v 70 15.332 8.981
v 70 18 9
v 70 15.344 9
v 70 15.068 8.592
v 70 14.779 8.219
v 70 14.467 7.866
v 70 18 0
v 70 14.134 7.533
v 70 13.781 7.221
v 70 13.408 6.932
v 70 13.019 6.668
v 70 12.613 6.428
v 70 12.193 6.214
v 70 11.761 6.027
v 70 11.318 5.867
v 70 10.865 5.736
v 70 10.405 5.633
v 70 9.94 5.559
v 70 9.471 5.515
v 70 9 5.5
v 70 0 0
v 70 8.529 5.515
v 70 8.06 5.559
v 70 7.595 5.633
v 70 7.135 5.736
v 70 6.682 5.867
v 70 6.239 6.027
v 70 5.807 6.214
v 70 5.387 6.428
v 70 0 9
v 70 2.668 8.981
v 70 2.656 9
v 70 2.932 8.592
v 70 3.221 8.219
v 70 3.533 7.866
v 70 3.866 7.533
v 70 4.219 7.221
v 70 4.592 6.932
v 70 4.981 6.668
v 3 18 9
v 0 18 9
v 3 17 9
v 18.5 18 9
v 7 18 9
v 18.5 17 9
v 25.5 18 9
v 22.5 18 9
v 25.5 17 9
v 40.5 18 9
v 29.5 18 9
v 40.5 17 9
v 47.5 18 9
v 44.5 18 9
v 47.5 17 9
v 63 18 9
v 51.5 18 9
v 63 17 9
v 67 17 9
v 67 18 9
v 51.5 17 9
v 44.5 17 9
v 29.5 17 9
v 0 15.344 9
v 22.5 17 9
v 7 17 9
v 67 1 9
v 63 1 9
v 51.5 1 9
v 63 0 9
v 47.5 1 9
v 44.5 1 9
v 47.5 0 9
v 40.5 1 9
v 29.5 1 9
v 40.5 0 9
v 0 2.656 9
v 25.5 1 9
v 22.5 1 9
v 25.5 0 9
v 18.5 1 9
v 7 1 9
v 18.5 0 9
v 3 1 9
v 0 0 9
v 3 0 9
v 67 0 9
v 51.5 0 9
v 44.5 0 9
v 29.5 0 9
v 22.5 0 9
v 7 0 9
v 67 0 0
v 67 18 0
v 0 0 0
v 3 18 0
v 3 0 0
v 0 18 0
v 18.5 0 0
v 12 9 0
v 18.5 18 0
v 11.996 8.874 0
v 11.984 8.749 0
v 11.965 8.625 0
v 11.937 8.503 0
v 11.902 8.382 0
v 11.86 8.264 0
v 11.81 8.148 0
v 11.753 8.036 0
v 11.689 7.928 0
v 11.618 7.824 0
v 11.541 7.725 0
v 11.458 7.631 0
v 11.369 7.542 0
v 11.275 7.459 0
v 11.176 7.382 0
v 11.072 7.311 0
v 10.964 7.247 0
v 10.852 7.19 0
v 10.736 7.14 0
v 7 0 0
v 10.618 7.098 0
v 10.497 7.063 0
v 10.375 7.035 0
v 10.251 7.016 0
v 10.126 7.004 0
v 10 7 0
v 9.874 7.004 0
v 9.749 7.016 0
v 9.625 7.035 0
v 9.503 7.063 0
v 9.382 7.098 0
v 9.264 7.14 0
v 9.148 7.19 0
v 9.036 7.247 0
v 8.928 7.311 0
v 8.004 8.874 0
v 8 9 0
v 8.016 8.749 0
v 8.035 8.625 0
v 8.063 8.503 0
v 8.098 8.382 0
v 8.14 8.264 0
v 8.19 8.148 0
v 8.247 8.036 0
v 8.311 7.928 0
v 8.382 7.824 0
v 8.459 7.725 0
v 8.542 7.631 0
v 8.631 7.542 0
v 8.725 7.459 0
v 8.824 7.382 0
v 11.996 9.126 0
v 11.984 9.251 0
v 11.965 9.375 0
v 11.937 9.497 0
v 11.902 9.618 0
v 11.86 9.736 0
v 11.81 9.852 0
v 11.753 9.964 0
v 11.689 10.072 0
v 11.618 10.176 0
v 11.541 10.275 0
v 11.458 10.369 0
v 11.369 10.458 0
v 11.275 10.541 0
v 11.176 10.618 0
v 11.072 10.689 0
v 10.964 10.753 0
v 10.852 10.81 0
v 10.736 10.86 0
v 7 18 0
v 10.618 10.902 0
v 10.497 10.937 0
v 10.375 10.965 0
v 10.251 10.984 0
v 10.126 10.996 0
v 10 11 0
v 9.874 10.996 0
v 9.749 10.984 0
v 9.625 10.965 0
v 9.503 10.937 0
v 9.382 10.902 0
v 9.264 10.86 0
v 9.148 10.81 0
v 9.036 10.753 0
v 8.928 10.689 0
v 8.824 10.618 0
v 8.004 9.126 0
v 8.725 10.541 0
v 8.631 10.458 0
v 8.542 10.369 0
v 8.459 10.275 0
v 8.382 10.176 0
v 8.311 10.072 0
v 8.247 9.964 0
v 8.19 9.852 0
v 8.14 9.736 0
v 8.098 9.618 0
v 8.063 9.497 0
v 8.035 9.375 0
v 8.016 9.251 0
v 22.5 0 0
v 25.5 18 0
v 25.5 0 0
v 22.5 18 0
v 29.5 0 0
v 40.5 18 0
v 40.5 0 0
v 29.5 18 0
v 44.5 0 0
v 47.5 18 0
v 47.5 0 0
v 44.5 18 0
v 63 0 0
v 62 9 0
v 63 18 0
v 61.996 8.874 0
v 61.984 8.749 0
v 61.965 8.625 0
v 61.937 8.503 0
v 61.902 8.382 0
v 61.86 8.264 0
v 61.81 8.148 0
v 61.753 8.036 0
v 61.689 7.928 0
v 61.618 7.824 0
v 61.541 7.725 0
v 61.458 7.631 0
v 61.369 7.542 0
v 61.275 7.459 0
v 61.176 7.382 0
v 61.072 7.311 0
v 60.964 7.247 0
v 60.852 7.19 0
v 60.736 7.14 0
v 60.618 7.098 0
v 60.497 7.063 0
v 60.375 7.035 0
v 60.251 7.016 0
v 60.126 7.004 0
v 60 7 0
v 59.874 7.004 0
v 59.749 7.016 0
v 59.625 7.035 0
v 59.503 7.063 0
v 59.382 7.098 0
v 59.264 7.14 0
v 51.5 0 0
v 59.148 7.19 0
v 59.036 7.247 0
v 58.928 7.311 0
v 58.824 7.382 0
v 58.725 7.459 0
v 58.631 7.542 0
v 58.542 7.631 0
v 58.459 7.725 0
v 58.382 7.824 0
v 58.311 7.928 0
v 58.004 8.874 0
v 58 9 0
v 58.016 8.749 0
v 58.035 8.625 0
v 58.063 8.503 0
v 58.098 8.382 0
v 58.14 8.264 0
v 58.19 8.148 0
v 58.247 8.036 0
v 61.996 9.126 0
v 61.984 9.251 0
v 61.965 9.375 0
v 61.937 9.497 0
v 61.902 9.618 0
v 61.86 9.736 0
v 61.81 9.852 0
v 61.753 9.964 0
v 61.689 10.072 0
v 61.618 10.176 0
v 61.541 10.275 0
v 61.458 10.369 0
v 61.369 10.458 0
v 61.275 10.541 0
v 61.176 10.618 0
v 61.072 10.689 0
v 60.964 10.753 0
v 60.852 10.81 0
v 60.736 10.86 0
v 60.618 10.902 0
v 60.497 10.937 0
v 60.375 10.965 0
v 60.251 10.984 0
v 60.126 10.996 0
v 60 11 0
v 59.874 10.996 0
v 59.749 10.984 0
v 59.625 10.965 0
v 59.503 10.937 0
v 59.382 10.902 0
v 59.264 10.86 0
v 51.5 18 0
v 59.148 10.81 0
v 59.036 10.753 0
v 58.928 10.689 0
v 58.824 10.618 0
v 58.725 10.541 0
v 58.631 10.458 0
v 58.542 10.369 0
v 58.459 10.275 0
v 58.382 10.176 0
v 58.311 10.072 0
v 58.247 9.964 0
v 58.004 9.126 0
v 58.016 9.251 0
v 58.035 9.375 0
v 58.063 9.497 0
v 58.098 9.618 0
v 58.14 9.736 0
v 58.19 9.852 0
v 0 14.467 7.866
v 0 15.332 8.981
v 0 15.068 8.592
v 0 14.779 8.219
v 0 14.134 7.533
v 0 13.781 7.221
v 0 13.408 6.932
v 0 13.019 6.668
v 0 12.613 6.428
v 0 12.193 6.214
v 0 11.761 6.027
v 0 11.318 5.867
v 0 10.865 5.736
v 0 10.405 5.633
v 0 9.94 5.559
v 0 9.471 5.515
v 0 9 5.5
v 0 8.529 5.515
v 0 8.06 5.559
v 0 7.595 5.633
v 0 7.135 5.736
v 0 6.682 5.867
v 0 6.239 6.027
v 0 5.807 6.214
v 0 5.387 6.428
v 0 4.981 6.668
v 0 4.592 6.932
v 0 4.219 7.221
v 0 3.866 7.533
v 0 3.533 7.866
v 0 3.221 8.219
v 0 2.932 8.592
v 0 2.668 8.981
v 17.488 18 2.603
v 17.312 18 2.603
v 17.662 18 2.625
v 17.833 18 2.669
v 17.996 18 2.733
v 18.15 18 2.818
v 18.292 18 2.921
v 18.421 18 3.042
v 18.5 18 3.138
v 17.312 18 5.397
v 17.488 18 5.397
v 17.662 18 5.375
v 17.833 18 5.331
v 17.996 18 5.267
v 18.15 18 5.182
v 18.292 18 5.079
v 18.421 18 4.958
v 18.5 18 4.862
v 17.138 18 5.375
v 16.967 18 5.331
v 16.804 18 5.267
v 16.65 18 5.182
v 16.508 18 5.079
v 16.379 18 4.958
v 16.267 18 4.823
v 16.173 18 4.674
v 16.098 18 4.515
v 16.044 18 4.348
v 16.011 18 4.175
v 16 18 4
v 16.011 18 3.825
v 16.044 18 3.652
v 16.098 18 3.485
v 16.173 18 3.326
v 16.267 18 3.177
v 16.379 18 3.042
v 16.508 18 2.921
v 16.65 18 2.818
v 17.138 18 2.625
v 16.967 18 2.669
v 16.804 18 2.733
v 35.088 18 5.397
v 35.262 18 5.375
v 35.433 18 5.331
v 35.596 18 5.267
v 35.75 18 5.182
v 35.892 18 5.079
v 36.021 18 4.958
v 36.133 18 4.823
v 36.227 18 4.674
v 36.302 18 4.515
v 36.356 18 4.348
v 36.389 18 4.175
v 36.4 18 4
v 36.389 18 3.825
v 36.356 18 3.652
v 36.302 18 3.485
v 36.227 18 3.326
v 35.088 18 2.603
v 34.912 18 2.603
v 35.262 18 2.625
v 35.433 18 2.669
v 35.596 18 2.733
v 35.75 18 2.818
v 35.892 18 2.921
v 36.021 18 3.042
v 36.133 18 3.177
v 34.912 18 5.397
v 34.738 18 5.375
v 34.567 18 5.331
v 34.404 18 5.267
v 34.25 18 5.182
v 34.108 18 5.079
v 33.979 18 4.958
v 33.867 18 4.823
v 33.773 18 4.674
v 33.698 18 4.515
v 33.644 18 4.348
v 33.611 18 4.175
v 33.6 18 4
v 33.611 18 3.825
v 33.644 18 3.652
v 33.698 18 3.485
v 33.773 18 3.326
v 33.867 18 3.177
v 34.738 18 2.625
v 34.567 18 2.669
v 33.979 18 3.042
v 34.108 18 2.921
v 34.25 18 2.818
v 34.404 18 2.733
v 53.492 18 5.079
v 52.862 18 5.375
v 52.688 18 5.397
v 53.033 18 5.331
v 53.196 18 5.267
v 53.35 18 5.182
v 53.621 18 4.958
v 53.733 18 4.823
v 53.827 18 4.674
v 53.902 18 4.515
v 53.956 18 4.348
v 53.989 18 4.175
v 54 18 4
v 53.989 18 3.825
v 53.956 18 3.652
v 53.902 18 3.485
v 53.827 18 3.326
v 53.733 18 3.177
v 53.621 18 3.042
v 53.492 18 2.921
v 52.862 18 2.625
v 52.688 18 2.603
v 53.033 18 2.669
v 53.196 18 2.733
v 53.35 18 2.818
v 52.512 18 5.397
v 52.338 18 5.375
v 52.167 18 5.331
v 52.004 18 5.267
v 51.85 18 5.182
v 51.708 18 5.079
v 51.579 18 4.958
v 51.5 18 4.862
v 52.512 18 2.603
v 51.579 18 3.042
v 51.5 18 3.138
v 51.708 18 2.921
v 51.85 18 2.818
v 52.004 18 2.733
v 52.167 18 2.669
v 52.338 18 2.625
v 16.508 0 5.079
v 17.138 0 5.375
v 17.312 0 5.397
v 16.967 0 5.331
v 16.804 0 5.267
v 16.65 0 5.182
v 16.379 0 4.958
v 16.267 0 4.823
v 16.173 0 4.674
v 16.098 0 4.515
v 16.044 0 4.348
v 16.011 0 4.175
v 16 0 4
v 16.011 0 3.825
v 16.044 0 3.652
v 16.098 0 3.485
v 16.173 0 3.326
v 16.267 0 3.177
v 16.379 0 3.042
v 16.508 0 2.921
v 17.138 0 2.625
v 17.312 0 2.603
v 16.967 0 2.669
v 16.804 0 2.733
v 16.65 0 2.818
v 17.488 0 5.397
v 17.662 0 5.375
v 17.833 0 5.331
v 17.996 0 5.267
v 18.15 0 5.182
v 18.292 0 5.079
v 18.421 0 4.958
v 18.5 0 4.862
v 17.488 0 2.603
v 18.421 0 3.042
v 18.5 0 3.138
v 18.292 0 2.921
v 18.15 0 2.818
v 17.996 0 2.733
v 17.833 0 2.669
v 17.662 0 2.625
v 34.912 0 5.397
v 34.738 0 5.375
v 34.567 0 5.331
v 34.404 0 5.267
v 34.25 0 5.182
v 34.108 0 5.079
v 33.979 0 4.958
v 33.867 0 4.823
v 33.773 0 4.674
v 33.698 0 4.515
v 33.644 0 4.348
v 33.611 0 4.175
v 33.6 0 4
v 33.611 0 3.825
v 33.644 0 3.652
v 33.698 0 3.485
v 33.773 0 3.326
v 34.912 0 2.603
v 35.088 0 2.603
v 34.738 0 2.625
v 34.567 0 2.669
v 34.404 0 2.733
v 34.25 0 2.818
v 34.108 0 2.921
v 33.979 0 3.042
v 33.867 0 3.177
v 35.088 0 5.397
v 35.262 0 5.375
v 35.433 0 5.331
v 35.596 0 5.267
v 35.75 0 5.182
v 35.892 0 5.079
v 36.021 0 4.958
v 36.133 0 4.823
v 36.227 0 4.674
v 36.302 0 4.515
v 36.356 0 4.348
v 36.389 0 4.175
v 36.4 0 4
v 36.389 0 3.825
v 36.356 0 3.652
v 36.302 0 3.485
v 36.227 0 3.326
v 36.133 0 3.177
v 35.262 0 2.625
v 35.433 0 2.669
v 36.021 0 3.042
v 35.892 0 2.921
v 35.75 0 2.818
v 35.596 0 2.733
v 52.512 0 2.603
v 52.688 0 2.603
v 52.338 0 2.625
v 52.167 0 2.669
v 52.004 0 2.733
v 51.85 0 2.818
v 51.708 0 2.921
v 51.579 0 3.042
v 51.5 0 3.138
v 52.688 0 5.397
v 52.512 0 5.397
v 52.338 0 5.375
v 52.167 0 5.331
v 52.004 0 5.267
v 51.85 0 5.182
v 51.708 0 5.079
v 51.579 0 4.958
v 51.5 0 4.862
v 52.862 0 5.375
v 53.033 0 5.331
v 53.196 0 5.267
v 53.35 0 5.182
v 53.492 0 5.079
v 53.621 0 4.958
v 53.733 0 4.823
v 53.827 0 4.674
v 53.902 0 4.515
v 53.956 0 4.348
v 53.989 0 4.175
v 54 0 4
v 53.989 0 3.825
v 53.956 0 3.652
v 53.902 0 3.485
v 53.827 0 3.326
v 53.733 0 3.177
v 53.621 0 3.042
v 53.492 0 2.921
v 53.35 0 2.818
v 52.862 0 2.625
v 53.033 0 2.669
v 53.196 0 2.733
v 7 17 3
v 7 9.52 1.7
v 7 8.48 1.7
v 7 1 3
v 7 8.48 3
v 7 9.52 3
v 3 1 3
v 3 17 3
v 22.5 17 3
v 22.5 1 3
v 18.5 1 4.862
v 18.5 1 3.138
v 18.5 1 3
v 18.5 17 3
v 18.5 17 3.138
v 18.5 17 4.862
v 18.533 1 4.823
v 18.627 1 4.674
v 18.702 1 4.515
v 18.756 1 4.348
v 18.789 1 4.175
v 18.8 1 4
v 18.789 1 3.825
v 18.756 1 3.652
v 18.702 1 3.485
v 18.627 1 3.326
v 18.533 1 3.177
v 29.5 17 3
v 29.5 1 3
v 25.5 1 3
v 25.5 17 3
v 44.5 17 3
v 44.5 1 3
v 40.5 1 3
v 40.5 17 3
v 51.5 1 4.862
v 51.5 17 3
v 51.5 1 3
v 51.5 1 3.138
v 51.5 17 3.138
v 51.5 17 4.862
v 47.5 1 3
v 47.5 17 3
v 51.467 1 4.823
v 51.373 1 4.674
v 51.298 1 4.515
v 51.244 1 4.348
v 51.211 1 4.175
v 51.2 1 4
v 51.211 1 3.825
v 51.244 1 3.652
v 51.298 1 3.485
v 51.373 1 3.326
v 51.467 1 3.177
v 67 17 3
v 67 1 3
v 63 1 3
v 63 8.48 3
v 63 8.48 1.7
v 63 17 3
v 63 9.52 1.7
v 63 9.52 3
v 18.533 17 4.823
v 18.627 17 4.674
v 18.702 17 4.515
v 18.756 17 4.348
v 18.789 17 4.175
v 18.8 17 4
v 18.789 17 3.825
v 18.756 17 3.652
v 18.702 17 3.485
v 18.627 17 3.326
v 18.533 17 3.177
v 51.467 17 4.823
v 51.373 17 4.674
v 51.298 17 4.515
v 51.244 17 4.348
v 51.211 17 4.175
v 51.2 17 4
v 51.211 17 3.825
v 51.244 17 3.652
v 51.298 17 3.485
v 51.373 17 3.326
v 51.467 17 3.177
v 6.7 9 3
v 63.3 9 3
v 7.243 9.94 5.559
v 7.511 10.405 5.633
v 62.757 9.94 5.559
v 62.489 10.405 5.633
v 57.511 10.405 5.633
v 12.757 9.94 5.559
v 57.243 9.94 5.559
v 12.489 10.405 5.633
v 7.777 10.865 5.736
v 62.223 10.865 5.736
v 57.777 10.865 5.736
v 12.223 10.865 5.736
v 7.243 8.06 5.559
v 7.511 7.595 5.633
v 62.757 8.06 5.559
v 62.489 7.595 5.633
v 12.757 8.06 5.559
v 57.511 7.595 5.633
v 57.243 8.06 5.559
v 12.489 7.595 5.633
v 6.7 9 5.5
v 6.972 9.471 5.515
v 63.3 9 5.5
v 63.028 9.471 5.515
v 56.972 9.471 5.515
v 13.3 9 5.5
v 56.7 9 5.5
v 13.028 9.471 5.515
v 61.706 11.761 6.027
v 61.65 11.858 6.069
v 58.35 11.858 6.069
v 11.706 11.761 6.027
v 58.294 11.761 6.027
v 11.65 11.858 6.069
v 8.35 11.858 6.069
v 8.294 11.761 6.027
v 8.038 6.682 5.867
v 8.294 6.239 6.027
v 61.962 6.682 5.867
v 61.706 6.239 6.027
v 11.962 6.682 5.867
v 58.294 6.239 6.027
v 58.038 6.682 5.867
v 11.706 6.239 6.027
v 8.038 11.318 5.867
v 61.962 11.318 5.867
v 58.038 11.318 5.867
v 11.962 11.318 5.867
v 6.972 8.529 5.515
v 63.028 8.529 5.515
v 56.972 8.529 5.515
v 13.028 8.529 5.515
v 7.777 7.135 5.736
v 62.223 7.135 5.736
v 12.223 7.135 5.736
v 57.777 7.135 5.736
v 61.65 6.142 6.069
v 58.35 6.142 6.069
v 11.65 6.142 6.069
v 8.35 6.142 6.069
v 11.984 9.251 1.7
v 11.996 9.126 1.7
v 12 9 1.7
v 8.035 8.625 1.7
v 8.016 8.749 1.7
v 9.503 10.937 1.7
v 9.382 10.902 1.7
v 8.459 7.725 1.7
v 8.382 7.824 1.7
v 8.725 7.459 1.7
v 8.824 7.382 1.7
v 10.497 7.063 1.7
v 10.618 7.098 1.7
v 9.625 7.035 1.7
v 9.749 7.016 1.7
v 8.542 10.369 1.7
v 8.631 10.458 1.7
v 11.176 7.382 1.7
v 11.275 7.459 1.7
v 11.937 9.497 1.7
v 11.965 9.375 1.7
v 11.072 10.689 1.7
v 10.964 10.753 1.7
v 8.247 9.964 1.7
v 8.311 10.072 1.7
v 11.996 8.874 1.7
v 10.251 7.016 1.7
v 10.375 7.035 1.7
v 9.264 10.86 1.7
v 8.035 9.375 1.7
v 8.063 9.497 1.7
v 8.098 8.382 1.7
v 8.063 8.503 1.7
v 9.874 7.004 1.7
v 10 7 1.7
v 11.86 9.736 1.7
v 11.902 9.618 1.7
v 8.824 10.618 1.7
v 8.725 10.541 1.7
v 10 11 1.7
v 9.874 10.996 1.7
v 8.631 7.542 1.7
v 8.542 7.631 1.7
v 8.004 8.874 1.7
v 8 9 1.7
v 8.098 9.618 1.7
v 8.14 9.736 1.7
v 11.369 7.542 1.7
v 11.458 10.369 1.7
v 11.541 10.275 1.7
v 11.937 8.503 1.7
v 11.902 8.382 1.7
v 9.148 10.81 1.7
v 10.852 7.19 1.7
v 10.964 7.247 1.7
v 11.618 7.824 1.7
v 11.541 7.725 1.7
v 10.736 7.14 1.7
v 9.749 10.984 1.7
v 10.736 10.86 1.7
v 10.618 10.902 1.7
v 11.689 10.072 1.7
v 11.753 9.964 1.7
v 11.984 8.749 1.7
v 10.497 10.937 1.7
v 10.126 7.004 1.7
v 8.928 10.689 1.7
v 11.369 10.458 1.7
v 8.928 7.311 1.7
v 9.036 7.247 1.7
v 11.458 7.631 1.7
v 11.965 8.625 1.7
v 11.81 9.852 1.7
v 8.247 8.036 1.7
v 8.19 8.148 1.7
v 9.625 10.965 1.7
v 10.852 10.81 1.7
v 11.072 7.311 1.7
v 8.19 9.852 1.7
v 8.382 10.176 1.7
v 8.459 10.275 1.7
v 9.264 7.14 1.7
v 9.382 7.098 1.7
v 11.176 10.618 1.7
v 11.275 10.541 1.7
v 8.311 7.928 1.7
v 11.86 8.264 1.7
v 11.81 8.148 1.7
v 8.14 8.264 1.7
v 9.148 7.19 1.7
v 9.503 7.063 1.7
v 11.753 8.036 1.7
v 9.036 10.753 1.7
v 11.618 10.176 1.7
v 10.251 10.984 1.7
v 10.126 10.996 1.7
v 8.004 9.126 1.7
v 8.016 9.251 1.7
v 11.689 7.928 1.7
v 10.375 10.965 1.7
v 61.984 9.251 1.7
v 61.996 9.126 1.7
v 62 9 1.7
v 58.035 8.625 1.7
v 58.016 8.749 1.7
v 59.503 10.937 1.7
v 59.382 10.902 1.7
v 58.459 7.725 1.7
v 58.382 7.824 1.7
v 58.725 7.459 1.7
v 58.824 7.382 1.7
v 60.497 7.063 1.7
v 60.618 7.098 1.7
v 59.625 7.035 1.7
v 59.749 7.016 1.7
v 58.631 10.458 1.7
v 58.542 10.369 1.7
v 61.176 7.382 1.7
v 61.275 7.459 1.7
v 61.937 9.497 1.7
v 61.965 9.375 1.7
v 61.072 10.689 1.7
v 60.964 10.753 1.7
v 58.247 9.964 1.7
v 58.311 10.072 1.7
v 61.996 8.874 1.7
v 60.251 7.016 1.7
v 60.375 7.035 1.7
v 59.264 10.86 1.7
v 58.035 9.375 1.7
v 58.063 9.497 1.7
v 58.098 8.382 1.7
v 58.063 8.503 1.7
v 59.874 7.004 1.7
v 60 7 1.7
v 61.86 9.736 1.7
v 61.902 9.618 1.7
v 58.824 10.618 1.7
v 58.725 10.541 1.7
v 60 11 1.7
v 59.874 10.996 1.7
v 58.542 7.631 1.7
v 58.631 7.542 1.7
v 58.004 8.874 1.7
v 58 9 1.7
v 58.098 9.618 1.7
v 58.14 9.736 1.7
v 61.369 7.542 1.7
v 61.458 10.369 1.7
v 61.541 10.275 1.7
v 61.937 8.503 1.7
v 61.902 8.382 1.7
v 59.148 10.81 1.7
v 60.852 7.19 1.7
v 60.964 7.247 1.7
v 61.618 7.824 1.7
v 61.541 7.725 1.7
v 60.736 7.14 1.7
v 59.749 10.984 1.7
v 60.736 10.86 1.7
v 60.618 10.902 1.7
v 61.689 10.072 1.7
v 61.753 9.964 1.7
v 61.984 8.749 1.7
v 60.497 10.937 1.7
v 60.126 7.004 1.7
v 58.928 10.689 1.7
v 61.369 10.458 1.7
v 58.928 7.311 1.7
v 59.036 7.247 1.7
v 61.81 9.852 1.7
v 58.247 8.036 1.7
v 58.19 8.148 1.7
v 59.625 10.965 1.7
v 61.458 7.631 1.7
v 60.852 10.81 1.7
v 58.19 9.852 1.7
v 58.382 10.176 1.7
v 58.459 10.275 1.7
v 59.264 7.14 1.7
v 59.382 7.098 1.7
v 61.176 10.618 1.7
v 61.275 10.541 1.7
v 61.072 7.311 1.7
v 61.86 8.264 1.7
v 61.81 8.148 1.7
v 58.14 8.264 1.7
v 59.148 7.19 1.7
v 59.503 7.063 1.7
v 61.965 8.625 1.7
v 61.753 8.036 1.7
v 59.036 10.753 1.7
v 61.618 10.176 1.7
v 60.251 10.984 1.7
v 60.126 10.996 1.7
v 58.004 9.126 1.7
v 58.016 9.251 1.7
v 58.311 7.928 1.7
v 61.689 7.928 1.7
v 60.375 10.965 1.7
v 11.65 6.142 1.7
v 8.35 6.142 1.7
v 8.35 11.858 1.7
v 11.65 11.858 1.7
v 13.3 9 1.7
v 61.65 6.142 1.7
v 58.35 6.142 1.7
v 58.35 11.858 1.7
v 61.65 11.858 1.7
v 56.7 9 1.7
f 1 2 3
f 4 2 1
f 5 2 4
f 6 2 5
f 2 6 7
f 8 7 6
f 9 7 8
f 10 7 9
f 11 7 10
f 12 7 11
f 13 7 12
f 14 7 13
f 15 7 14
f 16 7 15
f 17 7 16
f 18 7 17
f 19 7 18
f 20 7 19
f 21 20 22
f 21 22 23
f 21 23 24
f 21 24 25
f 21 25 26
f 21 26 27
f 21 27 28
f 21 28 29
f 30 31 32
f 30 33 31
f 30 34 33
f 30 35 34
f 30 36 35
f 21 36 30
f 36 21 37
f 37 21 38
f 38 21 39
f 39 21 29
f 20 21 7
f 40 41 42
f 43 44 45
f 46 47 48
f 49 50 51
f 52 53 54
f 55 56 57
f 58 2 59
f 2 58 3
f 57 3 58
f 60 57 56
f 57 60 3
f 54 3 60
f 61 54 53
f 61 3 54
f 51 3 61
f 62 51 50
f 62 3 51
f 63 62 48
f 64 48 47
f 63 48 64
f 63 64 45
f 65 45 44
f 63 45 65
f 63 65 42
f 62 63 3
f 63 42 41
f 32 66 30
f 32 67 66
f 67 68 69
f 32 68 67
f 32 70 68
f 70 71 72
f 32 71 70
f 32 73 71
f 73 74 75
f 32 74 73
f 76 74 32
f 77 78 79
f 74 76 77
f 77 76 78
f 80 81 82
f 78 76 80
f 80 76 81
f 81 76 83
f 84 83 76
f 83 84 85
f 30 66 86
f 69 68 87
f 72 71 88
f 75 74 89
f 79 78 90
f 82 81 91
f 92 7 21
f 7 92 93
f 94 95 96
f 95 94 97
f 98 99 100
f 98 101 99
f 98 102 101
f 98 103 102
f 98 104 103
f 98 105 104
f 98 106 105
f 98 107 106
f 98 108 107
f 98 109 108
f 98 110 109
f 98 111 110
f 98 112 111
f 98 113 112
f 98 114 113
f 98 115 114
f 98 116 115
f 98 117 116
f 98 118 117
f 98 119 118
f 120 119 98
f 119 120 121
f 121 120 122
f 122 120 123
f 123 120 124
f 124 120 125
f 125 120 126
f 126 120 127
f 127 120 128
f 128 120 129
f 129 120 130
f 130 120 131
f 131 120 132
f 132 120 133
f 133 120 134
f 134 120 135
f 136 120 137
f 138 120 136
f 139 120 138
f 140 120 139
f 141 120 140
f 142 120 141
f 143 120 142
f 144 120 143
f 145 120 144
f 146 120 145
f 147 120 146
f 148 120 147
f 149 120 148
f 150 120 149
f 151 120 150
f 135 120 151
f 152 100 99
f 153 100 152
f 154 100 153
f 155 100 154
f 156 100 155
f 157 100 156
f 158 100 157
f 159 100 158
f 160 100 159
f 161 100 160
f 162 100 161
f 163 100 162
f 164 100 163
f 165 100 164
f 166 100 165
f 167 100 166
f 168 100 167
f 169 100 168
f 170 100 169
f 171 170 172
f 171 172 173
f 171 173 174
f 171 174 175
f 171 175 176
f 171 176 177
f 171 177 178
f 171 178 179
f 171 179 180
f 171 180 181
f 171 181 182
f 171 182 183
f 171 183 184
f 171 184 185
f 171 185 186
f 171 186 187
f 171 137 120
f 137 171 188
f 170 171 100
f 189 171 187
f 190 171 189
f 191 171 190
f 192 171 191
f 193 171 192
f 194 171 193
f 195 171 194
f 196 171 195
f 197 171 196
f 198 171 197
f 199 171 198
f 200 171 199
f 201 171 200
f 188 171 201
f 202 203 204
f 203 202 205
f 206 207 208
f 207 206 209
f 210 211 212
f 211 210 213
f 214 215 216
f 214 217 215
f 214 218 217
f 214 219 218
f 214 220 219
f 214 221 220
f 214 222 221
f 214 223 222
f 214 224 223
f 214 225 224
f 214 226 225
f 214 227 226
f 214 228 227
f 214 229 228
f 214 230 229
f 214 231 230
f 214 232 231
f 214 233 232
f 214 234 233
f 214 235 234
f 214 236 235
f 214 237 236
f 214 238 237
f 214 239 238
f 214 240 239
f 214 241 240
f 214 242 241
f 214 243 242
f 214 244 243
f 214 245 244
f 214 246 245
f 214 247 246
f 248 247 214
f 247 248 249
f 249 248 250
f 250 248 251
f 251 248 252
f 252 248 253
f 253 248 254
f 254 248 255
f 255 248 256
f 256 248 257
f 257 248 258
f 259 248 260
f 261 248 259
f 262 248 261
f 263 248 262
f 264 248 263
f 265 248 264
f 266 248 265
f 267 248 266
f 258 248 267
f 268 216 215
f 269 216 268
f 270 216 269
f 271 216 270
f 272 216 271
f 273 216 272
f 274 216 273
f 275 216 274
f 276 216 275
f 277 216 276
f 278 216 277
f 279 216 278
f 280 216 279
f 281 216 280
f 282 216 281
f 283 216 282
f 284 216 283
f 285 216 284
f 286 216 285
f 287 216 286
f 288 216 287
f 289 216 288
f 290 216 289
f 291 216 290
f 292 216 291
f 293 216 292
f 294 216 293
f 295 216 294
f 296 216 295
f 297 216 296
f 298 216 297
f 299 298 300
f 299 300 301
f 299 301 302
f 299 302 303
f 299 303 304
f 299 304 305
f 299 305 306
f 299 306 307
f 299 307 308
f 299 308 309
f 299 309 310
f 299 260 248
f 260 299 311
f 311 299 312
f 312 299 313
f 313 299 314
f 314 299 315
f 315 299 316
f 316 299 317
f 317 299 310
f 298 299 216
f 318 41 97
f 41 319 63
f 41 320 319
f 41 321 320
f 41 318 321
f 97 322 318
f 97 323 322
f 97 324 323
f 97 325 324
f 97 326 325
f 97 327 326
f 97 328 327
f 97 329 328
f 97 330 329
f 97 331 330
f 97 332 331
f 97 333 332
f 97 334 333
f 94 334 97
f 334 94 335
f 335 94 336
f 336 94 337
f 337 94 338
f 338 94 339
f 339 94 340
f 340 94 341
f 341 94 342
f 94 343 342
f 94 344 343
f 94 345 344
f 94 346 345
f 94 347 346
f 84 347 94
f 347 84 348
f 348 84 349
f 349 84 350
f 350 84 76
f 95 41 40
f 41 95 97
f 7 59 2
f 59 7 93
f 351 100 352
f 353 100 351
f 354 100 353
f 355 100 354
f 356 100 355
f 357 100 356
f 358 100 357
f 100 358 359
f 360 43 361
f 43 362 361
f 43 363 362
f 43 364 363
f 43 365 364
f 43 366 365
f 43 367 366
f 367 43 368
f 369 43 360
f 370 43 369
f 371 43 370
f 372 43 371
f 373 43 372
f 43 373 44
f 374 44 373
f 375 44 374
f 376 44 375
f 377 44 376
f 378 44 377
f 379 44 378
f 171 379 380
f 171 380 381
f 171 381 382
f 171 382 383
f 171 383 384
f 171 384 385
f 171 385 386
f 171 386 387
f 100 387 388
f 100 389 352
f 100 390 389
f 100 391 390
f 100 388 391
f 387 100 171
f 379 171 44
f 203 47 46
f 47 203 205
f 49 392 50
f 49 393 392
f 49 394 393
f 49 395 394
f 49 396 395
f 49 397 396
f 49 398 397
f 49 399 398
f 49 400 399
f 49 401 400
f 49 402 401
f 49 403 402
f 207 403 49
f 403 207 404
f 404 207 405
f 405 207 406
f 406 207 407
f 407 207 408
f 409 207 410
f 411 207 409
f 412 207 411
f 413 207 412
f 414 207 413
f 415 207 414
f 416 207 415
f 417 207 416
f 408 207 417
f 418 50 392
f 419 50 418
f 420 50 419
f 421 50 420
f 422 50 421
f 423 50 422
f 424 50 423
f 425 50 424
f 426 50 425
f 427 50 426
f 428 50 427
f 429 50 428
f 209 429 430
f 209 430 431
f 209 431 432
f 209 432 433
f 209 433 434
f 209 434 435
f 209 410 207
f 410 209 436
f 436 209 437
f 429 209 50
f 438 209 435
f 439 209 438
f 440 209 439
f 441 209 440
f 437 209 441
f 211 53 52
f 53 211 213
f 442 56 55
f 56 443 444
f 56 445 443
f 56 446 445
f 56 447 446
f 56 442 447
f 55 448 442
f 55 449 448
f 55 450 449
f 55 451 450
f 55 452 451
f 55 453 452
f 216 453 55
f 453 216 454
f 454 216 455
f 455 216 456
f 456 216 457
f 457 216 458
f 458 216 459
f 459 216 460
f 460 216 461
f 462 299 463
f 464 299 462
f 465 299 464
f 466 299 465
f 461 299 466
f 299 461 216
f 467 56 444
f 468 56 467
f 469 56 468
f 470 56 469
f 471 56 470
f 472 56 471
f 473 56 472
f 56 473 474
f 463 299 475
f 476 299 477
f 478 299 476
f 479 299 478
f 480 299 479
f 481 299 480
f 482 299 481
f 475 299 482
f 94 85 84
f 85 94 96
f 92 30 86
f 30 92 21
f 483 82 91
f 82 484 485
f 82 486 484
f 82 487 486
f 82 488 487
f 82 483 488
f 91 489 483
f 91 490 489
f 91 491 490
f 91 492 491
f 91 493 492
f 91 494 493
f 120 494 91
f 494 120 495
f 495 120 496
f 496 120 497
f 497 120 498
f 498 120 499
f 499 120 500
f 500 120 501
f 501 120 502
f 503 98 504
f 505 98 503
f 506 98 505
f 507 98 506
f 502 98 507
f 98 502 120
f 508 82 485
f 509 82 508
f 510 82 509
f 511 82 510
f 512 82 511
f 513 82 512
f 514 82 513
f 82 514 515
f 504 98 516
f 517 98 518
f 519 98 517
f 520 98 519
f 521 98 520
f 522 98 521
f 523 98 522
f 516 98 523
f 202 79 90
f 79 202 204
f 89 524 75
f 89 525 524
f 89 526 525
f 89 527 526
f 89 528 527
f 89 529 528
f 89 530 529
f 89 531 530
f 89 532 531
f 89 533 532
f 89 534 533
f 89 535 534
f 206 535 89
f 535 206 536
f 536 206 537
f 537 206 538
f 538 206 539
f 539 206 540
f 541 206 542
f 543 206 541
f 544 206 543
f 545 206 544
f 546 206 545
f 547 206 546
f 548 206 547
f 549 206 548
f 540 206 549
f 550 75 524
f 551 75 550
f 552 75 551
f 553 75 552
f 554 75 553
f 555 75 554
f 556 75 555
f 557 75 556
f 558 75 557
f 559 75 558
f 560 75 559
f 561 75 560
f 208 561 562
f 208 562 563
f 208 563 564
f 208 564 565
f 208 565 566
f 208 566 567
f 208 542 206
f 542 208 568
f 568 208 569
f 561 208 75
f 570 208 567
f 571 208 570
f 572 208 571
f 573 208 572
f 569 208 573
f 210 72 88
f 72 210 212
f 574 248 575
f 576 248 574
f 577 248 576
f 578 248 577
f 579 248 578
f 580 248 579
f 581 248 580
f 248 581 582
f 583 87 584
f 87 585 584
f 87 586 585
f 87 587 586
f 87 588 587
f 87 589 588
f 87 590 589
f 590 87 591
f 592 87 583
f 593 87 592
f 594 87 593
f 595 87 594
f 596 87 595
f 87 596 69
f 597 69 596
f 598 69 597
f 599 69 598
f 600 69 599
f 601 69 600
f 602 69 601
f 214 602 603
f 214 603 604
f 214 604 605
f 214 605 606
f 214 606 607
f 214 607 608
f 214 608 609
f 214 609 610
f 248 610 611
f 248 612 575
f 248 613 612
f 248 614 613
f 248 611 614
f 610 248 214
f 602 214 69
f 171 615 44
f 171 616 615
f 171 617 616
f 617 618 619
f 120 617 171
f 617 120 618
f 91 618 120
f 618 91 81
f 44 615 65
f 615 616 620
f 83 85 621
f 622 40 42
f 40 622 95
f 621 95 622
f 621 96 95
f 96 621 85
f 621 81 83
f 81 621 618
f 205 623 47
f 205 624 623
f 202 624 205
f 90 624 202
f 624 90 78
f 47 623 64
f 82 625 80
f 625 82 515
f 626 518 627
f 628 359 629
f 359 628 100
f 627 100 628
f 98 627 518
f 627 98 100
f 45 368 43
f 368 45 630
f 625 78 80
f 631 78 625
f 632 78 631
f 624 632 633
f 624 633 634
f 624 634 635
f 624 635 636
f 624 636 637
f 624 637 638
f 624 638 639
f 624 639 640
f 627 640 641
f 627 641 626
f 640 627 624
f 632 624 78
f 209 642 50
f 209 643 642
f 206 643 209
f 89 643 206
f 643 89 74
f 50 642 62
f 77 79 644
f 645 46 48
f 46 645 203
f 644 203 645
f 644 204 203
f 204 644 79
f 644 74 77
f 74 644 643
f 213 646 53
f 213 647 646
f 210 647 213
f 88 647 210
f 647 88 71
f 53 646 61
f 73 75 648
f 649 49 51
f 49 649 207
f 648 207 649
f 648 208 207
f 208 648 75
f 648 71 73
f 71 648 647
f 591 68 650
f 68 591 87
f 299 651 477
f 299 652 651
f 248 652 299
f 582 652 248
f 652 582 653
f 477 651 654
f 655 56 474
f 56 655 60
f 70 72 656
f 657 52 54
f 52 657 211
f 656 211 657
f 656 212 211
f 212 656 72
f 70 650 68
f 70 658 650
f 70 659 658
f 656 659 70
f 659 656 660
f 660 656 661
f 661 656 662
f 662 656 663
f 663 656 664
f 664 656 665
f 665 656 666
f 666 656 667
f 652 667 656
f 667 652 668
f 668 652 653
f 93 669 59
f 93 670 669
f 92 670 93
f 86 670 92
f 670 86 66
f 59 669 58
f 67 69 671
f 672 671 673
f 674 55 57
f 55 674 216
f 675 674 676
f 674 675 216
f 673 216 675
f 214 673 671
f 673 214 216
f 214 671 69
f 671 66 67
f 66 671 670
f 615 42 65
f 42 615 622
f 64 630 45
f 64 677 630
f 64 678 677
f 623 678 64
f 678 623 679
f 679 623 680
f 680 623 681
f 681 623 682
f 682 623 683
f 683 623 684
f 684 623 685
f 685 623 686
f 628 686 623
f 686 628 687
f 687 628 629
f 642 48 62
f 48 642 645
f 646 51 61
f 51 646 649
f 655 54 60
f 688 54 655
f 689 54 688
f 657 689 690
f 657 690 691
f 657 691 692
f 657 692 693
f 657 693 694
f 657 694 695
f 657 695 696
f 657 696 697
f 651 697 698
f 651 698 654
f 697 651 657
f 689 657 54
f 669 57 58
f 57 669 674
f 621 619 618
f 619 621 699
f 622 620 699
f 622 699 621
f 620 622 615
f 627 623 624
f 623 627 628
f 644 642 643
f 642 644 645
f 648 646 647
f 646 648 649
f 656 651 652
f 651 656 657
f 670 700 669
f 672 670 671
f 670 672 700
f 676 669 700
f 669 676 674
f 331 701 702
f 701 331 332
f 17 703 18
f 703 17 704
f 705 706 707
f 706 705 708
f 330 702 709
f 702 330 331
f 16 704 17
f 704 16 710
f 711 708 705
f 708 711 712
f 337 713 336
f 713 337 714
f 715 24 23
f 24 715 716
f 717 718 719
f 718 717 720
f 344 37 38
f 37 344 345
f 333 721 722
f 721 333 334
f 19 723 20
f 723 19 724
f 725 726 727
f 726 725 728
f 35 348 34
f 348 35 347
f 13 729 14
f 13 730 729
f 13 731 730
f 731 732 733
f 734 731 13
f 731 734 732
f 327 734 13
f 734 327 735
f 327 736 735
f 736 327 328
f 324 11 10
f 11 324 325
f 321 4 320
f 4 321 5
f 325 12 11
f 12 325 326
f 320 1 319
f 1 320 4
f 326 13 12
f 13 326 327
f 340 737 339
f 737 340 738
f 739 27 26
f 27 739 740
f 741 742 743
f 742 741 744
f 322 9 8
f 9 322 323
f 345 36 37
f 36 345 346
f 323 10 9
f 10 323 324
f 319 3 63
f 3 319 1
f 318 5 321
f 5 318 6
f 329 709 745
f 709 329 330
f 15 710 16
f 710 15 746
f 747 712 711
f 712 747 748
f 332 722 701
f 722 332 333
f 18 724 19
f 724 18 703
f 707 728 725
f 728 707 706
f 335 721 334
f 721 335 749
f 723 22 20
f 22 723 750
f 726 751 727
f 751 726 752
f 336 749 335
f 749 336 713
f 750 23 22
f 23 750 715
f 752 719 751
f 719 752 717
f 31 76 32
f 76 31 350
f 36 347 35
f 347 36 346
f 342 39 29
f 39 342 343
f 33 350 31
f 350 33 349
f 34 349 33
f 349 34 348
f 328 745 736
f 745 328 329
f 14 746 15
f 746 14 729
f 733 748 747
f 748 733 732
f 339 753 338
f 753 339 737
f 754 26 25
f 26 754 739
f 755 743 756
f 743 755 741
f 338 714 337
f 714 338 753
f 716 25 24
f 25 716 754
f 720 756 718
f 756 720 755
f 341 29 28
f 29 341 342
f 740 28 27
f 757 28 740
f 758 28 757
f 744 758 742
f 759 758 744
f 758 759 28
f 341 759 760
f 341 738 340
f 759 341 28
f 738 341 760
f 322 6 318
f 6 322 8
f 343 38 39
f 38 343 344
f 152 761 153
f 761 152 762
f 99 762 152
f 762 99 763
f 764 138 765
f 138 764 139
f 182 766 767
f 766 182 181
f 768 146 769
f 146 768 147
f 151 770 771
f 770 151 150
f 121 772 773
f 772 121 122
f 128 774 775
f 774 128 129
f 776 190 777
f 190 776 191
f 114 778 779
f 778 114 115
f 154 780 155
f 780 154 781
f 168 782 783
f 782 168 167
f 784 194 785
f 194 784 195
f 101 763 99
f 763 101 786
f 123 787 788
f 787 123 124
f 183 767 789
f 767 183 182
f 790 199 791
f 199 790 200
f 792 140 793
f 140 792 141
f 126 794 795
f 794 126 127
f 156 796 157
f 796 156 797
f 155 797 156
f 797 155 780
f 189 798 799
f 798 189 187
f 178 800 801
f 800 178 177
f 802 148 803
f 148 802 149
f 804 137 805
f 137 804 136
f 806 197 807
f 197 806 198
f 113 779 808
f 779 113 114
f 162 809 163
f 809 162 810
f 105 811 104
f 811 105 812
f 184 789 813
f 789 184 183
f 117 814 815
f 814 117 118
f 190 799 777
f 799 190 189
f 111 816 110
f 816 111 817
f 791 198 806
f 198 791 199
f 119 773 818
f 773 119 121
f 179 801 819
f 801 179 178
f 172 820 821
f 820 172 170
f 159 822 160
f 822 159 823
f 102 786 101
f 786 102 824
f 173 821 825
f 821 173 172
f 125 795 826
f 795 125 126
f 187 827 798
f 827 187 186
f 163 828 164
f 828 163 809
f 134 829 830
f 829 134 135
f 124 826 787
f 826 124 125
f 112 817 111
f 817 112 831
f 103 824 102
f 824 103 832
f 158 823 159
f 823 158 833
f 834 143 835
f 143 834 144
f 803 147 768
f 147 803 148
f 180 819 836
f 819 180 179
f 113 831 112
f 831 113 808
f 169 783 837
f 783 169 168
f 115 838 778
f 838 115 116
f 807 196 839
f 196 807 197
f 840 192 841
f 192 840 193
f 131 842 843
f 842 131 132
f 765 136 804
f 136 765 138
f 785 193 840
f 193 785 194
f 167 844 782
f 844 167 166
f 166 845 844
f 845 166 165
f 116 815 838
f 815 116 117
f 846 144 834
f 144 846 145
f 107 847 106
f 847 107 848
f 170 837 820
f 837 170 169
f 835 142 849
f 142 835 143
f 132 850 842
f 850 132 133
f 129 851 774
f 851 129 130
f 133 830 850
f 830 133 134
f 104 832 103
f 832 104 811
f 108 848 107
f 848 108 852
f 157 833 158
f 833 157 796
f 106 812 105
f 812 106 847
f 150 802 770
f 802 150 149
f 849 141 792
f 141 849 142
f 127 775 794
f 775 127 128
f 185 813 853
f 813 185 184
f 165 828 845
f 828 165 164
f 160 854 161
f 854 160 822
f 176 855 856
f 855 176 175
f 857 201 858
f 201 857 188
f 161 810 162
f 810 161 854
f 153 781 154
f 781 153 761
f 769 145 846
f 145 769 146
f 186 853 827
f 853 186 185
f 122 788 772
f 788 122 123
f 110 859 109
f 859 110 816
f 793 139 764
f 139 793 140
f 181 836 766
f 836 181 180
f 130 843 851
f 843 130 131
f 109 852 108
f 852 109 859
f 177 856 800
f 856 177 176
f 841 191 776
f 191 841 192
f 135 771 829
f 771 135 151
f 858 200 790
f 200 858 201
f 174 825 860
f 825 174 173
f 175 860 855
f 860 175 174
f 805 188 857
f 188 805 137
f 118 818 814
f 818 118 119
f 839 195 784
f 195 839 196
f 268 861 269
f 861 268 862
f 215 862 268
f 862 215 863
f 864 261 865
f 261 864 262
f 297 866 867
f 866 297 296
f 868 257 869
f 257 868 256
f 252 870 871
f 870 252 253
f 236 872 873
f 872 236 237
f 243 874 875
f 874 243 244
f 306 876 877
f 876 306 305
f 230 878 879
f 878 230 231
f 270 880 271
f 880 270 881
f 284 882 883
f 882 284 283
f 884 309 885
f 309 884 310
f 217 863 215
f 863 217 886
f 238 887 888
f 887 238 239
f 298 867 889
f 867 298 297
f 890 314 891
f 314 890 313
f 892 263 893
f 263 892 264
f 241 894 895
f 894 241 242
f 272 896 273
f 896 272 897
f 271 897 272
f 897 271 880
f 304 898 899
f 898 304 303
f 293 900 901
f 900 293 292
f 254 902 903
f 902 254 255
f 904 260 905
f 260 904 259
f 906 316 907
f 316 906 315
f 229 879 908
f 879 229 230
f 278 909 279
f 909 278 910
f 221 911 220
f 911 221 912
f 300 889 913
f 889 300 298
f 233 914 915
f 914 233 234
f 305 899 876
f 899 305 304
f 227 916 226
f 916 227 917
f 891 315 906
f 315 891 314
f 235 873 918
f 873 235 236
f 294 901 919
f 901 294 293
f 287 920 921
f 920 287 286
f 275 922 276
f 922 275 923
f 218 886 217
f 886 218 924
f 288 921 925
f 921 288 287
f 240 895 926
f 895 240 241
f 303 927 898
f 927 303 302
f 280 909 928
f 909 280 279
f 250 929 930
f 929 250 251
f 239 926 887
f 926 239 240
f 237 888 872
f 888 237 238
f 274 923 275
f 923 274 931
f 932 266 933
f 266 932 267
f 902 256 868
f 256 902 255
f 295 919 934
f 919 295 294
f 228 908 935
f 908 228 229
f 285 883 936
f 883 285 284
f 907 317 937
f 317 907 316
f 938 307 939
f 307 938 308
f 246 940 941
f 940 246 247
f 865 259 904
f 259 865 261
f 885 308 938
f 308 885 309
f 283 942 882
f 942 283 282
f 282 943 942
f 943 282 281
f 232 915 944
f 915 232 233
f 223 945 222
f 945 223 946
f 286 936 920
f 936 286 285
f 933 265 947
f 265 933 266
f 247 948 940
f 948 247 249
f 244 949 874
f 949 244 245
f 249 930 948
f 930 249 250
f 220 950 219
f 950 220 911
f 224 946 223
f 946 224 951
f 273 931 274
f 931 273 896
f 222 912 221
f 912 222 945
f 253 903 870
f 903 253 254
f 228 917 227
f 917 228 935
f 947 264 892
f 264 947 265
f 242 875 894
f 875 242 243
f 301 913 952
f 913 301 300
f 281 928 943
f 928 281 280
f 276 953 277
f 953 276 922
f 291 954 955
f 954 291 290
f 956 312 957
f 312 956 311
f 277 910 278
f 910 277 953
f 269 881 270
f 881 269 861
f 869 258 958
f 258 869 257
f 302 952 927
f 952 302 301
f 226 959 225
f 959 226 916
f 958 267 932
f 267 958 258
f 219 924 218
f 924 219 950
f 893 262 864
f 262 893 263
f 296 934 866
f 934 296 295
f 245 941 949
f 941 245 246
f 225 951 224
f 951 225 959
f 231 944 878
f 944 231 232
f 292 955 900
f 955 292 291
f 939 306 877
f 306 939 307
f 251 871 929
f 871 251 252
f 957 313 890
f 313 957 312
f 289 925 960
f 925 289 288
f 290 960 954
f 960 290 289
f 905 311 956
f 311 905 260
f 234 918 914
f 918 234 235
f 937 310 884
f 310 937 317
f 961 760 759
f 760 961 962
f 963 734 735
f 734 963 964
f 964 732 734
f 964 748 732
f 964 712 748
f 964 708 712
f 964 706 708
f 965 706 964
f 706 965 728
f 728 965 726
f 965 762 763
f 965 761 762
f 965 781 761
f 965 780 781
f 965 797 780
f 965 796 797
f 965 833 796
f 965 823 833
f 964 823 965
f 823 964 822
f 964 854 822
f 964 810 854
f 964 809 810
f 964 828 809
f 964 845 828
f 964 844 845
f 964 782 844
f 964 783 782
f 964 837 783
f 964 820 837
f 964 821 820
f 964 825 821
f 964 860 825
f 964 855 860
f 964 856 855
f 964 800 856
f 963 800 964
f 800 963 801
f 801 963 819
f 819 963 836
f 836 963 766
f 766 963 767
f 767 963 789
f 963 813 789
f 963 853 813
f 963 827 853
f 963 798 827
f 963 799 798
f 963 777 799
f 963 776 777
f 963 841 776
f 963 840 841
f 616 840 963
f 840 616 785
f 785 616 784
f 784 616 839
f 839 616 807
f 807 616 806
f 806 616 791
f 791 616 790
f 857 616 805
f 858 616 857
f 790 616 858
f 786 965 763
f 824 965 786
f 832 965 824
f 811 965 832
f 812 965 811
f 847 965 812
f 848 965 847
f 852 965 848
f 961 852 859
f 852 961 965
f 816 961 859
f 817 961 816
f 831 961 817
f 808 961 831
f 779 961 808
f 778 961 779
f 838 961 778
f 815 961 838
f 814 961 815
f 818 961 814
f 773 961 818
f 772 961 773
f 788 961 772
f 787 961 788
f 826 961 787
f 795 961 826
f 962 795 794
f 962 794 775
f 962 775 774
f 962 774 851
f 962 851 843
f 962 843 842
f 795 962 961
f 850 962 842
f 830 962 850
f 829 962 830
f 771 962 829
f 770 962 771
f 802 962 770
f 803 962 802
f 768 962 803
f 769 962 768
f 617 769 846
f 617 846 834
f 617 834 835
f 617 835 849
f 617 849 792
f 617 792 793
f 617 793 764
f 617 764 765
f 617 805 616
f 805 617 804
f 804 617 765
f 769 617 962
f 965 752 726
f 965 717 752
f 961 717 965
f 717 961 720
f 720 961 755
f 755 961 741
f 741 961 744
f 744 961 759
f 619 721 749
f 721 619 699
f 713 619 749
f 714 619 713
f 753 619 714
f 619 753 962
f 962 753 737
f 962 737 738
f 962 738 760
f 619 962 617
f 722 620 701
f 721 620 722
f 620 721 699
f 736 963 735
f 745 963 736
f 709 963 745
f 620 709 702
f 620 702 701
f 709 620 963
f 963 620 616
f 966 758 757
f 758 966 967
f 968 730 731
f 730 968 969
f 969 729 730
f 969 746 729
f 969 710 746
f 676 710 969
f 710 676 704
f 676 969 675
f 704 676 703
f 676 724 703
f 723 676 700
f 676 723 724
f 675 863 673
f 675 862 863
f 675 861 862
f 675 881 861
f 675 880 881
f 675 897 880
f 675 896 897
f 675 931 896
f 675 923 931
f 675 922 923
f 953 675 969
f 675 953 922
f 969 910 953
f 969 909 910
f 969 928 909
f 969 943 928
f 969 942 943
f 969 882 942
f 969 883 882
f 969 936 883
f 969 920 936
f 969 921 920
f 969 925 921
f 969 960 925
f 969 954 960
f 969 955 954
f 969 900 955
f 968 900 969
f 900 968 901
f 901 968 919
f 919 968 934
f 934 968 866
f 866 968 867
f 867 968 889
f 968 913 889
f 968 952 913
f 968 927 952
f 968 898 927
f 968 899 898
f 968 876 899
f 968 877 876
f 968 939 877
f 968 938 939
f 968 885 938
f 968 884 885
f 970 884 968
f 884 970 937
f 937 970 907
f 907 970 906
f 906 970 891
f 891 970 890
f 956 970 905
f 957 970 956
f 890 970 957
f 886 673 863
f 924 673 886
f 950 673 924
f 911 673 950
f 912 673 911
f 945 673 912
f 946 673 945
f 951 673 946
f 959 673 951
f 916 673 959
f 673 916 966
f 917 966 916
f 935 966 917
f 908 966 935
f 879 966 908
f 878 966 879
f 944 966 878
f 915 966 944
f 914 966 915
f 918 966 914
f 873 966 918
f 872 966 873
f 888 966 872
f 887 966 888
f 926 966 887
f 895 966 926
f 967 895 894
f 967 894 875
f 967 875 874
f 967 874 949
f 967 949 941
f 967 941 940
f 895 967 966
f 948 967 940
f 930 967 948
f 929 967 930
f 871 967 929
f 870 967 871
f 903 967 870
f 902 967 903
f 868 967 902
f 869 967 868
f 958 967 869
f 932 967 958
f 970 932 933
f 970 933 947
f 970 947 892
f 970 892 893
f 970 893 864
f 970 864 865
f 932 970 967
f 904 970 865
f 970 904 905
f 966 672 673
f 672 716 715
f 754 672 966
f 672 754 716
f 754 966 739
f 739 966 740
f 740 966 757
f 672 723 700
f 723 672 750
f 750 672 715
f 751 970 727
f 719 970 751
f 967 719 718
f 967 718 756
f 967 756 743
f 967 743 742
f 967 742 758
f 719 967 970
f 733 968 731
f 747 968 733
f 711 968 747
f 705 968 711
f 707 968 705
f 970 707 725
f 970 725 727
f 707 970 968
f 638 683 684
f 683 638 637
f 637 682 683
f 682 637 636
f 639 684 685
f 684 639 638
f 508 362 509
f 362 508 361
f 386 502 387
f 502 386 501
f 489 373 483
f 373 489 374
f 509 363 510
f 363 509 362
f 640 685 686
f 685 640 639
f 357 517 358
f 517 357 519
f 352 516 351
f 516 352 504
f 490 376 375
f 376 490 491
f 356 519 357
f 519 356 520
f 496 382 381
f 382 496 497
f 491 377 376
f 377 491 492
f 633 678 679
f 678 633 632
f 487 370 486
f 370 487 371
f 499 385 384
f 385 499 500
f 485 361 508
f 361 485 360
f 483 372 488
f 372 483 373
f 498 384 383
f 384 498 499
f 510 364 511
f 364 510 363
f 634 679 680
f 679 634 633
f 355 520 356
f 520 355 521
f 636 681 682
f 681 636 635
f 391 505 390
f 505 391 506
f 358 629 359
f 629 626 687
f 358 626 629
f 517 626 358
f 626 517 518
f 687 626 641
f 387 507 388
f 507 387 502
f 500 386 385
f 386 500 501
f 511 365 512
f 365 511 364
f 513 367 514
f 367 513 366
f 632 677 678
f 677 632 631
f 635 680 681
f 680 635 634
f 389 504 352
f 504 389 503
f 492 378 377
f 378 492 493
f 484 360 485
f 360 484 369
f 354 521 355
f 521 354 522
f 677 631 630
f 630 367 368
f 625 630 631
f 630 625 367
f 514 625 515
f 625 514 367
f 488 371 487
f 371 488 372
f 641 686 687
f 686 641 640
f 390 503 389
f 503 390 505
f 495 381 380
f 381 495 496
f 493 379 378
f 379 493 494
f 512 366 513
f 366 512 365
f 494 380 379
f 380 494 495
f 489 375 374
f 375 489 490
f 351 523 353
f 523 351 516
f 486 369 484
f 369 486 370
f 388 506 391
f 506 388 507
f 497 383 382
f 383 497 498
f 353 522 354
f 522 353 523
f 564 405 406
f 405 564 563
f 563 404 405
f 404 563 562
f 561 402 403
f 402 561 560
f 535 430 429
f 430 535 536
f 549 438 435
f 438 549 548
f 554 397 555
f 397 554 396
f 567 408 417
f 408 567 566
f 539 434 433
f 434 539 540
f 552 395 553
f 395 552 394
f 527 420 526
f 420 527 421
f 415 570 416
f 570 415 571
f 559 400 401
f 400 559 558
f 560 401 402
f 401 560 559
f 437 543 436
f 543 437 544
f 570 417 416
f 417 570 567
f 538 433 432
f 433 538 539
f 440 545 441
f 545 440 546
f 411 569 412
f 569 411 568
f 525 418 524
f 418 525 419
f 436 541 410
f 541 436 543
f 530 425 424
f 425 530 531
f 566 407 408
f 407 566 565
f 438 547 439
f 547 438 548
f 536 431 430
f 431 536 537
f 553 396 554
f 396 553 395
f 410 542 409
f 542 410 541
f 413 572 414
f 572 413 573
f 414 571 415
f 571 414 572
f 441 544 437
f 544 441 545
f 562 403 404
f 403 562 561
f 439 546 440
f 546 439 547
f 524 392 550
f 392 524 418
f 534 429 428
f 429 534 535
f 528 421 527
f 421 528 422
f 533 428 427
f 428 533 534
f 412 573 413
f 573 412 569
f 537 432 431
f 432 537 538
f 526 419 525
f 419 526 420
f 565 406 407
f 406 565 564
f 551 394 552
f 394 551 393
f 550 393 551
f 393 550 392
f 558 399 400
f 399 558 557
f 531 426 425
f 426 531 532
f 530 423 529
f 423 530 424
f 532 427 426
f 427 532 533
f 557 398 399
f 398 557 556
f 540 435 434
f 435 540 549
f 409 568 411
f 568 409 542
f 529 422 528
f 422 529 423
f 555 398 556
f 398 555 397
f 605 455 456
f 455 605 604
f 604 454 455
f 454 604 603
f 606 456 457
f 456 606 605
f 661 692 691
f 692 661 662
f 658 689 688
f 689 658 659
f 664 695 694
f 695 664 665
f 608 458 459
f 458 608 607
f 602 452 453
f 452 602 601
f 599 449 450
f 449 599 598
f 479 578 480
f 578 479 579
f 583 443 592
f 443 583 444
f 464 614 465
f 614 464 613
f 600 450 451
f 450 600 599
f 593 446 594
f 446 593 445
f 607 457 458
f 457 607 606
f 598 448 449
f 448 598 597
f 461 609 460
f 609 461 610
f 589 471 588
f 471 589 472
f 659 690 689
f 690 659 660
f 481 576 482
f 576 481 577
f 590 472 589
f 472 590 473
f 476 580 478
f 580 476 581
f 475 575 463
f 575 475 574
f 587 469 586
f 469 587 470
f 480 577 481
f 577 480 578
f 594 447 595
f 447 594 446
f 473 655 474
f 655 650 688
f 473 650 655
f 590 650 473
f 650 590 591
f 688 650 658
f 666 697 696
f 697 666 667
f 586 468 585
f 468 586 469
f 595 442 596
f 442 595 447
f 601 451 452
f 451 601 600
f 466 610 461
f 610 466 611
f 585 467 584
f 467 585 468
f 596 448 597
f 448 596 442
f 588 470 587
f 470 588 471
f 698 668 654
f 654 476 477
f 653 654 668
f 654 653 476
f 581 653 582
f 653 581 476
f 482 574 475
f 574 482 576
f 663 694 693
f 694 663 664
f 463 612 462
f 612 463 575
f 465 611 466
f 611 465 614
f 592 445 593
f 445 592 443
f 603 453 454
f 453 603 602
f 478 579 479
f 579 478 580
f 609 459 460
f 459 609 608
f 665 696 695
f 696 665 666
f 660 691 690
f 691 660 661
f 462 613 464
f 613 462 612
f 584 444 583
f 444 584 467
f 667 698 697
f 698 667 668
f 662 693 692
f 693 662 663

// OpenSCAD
r_ecrou_m3=3.3;
l_gorge_collier=1;
r_douille=7.5;
r_trou_m3=2;
r_vis=1.4;

module base_piece(){
difference(){
	cube([ 70, 18, 9 ]);
	
	//passages pour colliers droites
	translate([3,0,0]){cube([ 4, l_gorge_collier, 9 ]);}
	translate([18.5,0,0]){cube([ 4, l_gorge_collier, 9 ]);}
	translate([25.5,0,0]){cube([ 4, l_gorge_collier, 9 ]);}
	translate([40.5,0,0]){cube([ 4, l_gorge_collier, 9 ]);}
	translate([47.5,0,0]){cube([ 4, l_gorge_collier, 9 ]);}
	translate([63,0,0]){cube([ 4, l_gorge_collier, 9 ]);}
	
	//passages pour colliers gauches
	translate([3,17,0]){cube([ 4, l_gorge_collier, 9 ]);}
	translate([18.5,17,0]){cube([ 4, l_gorge_collier, 9 ]);}
	translate([25.5,17,0]){cube([ 4, l_gorge_collier, 9 ]);}
	translate([40.5,17,0]){cube([ 4, l_gorge_collier, 9 ]);}
	translate([47.5,17,0]){cube([ 4, l_gorge_collier, 9 ]);}
	translate([63,17,0]){cube([ 4, l_gorge_collier, 9 ]);}

	//passages pour colliers dessous
	translate([3,1,0]){cube([ 4, 16, l_gorge_collier*3 ]);}
	translate([18.5,1,0]){cube([ 4, 16, l_gorge_collier*3 ]);}
	translate([25.5,1,0]){cube([ 4, 16, l_gorge_collier*3 ]);}
	translate([40.5,1,0]){cube([ 4, 16, l_gorge_collier*3 ]);}
	translate([47.5,1,0]){cube([ 4, 18, l_gorge_collier*3 ]);}
	translate([63,1,0]){cube([ 4, 16, l_gorge_collier*3 ]);}

	//cylindre pour passage douilles
	translate([-1,9,13]){
		rotate([0,90,0])cylinder(h = 80, r = r_douille, $fn=100);
	}

	//cylindres pour trous vis
	translate([10,9,0]){cylinder(h = 7, r = r_trou_m3, $fn=100);}
	translate([60,9,0]){cylinder(h = 7, r = r_trou_m3, $fn=100);}
	//hexagones pour écrous
	translate([10,9,1.7]){cylinder(h = 7, r = r_ecrou_m3, $fn=6);}
	translate([60,9,1.7]){cylinder(h = 7, r = r_ecrou_m3, $fn=6);}

	//prétrous pour vissage ventilateur
	translate([17.4,-5,4]){rotate([-90,0,0])cylinder(r=r_vis, h=25, $fn=50);}
	translate([35,-5,4]){rotate([-90,0,0])cylinder(r=r_vis, h=25, $fn=50);}
	translate([52.6,-5,4]){rotate([-90,0,0])cylinder(r=r_vis, h=25, $fn=50);}
}
}


base_piece();
